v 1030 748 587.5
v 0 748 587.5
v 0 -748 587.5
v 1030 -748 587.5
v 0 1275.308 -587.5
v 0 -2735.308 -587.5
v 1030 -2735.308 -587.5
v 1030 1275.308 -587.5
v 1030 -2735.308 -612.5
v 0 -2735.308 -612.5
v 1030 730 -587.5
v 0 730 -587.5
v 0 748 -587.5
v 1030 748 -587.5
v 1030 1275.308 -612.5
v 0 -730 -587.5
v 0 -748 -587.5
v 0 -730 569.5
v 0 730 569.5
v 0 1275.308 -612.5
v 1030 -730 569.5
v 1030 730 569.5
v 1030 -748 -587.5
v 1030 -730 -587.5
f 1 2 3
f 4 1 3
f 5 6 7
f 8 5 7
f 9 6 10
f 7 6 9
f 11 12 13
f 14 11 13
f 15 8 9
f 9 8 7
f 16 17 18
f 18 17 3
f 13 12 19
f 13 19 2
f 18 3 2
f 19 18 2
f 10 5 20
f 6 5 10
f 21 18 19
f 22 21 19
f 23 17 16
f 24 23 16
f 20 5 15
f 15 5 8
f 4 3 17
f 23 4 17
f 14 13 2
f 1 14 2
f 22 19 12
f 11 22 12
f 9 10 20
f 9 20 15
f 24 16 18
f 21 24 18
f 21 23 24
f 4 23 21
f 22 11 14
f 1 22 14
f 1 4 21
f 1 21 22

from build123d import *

# Parameters (mm, degrees)
F1_DEPTH = 1030
F2_W     = 1030
F2_H     = 4010.616026
F3_DEPTH = 25


with BuildPart() as f1:
    # F0 (on Right) → F1 (new body)
    with BuildSketch(Plane.YZ):
        Polygon((748, -587.5), (748, 587.5), (-748, 587.5), (-748, -587.5), (-730, -587.5), (-730, 569.5), (730, 569.5), (730, -587.5), align=None)
    extrude(amount=F1_DEPTH)


with BuildPart() as f3:
    # F2 (on face) → F3 (new body)
    with BuildSketch(Plane(origin=(0, 0, -587.5), x_dir=(1, 0, 0), z_dir=(0, 0, -1))):
        with Locations((515, 730)):
            Rectangle(F2_W, F2_H)
    extrude(amount=F3_DEPTH)


solid = Compound([f1.part, f3.part])
